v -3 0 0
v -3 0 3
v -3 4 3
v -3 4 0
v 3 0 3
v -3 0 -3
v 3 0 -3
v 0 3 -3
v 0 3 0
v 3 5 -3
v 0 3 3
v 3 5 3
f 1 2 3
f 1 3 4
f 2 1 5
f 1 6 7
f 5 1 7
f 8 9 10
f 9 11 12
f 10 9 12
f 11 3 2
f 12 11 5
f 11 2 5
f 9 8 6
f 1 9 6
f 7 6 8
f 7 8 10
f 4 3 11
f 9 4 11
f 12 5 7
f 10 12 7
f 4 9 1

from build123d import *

# Parameters (mm, degrees)
SKETCH1_W           = 6
SKETCH1_H           = 6
BOSS_EXTRUDE1_DEPTH = 5
CUT_EXTRUDE3_DEPTH  = 13.5
CUT_EXTRUDE4_DEPTH  = 3


with BuildPart() as part:
    # Sketch1 → Boss-Extrude1 (new body)
    with BuildSketch(Plane(origin=(0, 0, 0), x_dir=(1, 0, 0), z_dir=(0, 1, 0))):
        Rectangle(SKETCH1_W, SKETCH1_H)
    extrude(amount=BOSS_EXTRUDE1_DEPTH)

    # Sketch5 → Cut-Extrude3 (cut)
    with BuildSketch(Plane.XY.offset(3)):
        Polygon((-3, 5), (0, 3), (3, 5), align=None)
        Polygon((0, 3), (-3, 5), (-3, 4), align=None)
    extrude(amount=-CUT_EXTRUDE3_DEPTH, mode=Mode.SUBTRACT)

    # Sketch7 → Cut-Extrude4 (cut)
    with BuildSketch(Plane(origin=(0, 0, -3), x_dir=(-1, 0, 0), z_dir=(0, 0, -1))):
        Polygon((0, 3), (3, 0), (3, 6), align=None)
    extrude(amount=-CUT_EXTRUDE4_DEPTH, mode=Mode.SUBTRACT)


solid = part.part
